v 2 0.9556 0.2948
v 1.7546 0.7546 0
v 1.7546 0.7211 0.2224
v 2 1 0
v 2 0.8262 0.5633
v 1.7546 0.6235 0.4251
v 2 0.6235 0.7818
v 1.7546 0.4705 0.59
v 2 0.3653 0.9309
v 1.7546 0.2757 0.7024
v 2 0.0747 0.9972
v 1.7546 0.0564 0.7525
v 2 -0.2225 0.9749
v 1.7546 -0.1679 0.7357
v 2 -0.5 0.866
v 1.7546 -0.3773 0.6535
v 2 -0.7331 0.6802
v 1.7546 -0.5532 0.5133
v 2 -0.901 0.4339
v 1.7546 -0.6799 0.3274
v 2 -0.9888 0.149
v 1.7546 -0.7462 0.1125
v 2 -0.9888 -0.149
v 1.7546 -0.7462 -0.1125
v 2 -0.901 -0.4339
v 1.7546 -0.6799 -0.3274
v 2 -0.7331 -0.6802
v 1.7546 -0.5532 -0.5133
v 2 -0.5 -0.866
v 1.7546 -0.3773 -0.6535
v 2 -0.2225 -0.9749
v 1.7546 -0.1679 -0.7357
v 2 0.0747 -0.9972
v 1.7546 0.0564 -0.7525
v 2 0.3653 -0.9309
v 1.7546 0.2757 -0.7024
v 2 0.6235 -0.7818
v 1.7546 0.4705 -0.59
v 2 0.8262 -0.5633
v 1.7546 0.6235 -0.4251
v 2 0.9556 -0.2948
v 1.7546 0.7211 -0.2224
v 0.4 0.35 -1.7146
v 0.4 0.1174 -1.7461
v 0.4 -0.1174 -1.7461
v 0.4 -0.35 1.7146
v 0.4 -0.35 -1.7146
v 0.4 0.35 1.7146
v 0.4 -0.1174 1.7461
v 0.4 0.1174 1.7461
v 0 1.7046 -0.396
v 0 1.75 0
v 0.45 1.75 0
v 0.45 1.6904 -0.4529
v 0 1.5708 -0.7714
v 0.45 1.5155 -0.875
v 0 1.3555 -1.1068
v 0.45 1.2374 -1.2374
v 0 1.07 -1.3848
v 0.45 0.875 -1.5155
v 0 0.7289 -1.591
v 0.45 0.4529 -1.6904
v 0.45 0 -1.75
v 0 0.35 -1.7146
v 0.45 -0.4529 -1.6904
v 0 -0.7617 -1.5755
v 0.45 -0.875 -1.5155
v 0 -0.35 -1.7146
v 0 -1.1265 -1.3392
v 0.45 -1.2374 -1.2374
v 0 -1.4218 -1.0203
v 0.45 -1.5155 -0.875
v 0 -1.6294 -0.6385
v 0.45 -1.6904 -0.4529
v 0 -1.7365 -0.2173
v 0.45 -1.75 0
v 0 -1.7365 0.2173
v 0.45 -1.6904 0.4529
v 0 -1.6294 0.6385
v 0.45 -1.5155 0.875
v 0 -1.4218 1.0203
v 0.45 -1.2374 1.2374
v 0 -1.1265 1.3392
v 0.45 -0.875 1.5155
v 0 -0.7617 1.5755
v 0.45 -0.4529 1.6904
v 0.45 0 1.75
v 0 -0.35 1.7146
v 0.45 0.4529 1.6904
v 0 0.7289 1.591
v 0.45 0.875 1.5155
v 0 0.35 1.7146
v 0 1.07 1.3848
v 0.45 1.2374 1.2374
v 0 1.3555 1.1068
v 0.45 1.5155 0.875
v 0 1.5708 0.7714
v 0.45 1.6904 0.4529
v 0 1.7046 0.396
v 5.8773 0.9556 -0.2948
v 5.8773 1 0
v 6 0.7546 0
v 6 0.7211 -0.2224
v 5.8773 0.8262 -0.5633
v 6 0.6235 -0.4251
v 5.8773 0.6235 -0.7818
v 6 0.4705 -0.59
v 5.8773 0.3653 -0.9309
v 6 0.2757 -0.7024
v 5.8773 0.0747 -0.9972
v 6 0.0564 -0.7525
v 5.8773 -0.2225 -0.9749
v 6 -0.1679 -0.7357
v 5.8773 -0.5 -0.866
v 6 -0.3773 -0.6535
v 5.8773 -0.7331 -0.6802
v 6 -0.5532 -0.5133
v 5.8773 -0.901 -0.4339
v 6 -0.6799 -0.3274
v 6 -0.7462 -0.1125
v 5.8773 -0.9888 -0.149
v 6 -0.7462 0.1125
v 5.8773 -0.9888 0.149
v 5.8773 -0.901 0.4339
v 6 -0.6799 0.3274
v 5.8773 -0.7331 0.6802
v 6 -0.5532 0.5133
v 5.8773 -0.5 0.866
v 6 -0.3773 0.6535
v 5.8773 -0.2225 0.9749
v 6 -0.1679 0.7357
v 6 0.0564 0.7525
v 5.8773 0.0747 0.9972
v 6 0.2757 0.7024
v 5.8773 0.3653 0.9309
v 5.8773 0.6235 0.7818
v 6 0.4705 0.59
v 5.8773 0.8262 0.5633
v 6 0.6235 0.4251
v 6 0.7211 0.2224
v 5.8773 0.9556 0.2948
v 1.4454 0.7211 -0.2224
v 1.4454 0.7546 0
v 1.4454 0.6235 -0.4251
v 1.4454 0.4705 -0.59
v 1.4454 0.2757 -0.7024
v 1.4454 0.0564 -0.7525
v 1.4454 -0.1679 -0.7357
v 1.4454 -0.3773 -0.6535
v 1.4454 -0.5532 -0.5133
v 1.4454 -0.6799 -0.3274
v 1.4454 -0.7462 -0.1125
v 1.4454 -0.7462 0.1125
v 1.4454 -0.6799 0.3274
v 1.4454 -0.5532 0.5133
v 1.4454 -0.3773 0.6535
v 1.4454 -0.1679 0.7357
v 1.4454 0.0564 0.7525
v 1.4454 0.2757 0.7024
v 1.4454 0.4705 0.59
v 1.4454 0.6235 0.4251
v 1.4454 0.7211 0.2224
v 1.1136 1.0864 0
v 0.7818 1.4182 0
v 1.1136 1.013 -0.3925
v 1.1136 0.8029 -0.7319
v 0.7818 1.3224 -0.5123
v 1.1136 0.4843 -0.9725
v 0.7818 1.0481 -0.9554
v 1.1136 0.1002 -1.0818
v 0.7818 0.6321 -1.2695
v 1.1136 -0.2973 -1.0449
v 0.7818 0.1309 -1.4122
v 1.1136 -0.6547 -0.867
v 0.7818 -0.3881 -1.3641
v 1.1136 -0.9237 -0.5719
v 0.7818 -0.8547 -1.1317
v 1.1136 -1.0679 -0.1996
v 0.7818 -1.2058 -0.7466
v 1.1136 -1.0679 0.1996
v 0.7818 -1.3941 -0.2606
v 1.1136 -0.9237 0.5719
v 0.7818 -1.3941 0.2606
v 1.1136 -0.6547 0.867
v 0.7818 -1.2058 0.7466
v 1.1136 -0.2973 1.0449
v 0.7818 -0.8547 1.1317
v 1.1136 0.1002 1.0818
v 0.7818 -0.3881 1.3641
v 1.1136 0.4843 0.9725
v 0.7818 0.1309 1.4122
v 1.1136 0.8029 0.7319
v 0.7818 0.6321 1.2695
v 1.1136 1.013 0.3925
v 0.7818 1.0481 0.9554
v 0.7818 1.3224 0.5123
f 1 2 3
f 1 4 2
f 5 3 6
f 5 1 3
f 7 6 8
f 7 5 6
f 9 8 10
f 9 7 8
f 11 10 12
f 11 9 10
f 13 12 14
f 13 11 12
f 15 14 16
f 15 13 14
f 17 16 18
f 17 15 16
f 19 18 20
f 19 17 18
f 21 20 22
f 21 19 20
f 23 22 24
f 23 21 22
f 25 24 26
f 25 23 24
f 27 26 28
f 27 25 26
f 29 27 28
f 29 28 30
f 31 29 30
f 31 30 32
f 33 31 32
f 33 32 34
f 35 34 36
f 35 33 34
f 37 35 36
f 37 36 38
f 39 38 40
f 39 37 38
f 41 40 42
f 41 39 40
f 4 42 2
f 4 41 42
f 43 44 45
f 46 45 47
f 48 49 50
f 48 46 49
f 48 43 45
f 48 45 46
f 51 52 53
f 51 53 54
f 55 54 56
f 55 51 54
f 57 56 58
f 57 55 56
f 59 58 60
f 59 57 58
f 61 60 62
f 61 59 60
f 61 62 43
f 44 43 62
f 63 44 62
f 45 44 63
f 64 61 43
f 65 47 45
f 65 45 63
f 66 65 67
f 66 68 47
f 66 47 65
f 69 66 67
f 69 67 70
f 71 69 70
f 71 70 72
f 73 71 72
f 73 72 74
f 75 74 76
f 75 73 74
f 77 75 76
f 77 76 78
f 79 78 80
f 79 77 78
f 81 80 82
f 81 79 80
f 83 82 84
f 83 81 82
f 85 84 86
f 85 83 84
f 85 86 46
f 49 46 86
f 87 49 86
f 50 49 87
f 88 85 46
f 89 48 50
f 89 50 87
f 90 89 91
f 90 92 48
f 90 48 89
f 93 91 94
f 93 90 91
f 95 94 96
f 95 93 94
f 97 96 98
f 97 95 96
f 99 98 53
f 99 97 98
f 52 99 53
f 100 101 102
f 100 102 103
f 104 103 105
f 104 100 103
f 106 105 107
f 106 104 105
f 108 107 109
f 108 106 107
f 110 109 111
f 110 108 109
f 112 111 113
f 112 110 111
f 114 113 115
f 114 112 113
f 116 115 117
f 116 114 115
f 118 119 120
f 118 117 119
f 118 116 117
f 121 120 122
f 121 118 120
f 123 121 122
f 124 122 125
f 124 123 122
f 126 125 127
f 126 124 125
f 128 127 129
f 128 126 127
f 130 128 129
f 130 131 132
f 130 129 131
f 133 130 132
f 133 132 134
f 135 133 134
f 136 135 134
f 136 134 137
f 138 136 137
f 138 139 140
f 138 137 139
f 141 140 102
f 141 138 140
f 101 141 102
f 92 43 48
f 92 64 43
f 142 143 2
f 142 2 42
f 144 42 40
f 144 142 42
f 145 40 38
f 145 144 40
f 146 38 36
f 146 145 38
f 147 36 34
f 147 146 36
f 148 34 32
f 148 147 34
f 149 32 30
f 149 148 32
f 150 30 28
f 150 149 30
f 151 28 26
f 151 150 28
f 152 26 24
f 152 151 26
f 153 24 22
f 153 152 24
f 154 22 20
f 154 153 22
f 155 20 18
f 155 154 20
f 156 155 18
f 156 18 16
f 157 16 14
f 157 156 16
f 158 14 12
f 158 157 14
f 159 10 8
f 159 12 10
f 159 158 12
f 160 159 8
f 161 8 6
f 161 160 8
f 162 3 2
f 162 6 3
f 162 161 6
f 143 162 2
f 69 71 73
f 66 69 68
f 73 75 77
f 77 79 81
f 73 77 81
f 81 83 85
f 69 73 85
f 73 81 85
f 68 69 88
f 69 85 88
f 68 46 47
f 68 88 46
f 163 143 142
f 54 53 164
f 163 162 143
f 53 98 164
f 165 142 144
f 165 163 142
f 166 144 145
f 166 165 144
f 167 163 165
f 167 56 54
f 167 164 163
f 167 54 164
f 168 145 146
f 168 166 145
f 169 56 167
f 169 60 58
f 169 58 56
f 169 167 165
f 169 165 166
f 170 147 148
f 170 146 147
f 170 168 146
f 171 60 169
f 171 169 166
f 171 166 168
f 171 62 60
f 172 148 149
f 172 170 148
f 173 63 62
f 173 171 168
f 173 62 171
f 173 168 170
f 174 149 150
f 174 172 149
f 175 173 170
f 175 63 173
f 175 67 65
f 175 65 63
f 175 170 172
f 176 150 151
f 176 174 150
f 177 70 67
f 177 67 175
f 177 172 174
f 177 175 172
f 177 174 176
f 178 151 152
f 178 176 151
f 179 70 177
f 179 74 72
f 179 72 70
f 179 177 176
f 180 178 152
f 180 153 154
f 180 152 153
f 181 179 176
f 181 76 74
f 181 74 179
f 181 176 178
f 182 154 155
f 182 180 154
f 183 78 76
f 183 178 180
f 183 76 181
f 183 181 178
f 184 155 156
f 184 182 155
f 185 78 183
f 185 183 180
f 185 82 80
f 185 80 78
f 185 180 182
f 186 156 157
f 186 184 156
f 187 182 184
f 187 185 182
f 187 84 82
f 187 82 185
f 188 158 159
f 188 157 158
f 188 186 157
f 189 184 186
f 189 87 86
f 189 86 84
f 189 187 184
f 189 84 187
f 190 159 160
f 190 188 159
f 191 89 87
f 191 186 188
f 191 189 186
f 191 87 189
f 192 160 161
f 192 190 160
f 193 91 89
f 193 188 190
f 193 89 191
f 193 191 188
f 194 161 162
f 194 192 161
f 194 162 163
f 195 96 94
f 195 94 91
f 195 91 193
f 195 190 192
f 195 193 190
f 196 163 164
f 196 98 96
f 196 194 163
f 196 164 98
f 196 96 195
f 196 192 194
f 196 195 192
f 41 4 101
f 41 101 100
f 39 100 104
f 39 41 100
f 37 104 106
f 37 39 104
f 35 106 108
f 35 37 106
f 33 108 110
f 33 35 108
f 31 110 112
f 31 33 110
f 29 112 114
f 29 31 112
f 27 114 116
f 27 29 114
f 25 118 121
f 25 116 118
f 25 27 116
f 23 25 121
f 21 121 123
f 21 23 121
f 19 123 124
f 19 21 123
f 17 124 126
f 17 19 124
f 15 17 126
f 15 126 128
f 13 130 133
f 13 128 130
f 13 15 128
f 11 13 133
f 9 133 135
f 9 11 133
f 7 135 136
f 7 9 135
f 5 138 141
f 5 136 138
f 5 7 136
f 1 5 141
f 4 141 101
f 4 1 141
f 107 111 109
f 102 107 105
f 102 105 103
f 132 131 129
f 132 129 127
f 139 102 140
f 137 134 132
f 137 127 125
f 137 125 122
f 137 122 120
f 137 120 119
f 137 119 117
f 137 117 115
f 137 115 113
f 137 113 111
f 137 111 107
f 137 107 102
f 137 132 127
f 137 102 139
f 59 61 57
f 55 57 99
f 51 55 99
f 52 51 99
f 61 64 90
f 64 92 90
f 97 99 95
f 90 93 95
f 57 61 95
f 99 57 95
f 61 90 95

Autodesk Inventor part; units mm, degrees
ref_plane "YZ Plane" through (0, 0, 0) normal (1, 0, 0) x (0, 1, 0)
ref_plane "XZ Plane" through (0, 0, 0) normal (0, 1, 0) x (-1, 0, 0)
sketch "Sketch1" plane through (0, 0, 0) normal (0, 0, 1) x (1, 0, 0)
  line L0 (0, 0) -> (6, 0)
  line L1 (6, 0) -> (6, 1)
  line L2 (6, 1) -> (2, 1)
  line L3 (2, 1) -> (1.7546, 0.7546)
  line L4 (1.7546, 0.7546) -> (1.4454, 0.7546)
  line L5 (1.4454, 0.7546) -> (0.45, 1.75)
  line L6 (0.45, 1.75) -> (0, 1.75)
  line L7 (0, 1.75) -> (0, 0)
  line L8 (2, 1) -> (1.2, 1) construction
  line L9 (-1.2, 0) -> (7.2, 0) projected
  line L10 (0, 2.1) -> (0, -0.35) projected
  dimension "d0" = 6
  dimension "d1" = 45
  dimension "d2" = 0.2454
  dimension "d3" = 4
  dimension "d4" = 1.2
  dimension "d5" = 1.5092
  dimension "d6" = 2
  dimension "d7" = 3.5
revolve "Body" add sketch "Sketch1" angle 360 about axis through (0, 0, 0) along (1, 0, 0)
sketch "Sketch2" plane through (0, 0, 0) normal (-1, 0, 0) x (0, 0, 1)
  line L0 (1.75, -0.35) -> (-1.75, -0.35)
  line L1 (-1.75, -0.35) -> (-1.75, 0.35)
  line L2 (-1.75, 0.35) -> (1.75, 0.35)
  line L3 (1.75, 0.35) -> (1.75, -0.35)
  line L4 (0, 0.35) -> (0, -0.35) construction
  line L5 (-1.75, 0) -> (1.75, 0) construction
  line L6 (0, 1.75) -> (0, 0) projected
  dimension "d15" = 0.7
  dimension "d16" = 3.5
extrude "Slot" cut sketch "Sketch2" against normal blind 0.4
thread "Thread" size "M2x0.4" class "6g" standard "ISO Metric profile" length 4
chamfer "Chamfer1" distance 0.2454 distance2 0.1227 1 edges at (6, -1, 0) measured on face at (6, -0.0858, 0.7069)
ref_plane "Work Plane1" through (33.575, 0, 0) normal (0, 0, -1) x (1, 0, 0)
equation "\"d0\" = NLG"
equation "\"d1\" = 0.5 * SEWI"
equation "\"d2\" = GAL"
equation "\"d3\" = GEL"
equation "\"d4\" = KOH"
equation "\"d5\" = BDM"
equation "\"d6\" = GD"
equation "\"d7\" = KOD"
equation "\"d15\" = SBR"
equation "\"d16\" = KOD"
equation "\"d8\" = STI"
equation "\"d10\" = GEL"
equation "\"d12\" = -0.5 * SPD + 0.5 * GD"
equation "\"d13\" = 0.5 * GAL"
equation "\"NLG\" = 6"
equation "\"GAL\" = 0.61345 * PTC"
equation "\"GEL\" = 4"
equation "\"KOH\" = 1.2"
equation "\"KOD\" = 3.5"
equation "\"SEWI\" = 90deg"
equation "\"BDM\" = NND - 1.2269 * PTC"
equation "\"GD\" = NND"
equation "\"SBR\" = 0.7"
equation "\"STI\" = 0.4"
equation "\"SPD\" = NND - 1.2269 * PTC"
equation "\"GUL\" = 0.61345 * PTC"
equation "\"PTC\" = 0.4"
equation "\"EPV\" = 2.2"
equation "\"THREADDIA\" = 2"
equation "\"TOA\" = 30deg"
equation "\"RR\" = 0.2"
equation "\"NND\" = 2"
equation "\"GD1\" = THREADDIA - 1.2269 * PTC"
properties part number "AS 1427 - M2 x 6(8)" material "Steel, Mild"
